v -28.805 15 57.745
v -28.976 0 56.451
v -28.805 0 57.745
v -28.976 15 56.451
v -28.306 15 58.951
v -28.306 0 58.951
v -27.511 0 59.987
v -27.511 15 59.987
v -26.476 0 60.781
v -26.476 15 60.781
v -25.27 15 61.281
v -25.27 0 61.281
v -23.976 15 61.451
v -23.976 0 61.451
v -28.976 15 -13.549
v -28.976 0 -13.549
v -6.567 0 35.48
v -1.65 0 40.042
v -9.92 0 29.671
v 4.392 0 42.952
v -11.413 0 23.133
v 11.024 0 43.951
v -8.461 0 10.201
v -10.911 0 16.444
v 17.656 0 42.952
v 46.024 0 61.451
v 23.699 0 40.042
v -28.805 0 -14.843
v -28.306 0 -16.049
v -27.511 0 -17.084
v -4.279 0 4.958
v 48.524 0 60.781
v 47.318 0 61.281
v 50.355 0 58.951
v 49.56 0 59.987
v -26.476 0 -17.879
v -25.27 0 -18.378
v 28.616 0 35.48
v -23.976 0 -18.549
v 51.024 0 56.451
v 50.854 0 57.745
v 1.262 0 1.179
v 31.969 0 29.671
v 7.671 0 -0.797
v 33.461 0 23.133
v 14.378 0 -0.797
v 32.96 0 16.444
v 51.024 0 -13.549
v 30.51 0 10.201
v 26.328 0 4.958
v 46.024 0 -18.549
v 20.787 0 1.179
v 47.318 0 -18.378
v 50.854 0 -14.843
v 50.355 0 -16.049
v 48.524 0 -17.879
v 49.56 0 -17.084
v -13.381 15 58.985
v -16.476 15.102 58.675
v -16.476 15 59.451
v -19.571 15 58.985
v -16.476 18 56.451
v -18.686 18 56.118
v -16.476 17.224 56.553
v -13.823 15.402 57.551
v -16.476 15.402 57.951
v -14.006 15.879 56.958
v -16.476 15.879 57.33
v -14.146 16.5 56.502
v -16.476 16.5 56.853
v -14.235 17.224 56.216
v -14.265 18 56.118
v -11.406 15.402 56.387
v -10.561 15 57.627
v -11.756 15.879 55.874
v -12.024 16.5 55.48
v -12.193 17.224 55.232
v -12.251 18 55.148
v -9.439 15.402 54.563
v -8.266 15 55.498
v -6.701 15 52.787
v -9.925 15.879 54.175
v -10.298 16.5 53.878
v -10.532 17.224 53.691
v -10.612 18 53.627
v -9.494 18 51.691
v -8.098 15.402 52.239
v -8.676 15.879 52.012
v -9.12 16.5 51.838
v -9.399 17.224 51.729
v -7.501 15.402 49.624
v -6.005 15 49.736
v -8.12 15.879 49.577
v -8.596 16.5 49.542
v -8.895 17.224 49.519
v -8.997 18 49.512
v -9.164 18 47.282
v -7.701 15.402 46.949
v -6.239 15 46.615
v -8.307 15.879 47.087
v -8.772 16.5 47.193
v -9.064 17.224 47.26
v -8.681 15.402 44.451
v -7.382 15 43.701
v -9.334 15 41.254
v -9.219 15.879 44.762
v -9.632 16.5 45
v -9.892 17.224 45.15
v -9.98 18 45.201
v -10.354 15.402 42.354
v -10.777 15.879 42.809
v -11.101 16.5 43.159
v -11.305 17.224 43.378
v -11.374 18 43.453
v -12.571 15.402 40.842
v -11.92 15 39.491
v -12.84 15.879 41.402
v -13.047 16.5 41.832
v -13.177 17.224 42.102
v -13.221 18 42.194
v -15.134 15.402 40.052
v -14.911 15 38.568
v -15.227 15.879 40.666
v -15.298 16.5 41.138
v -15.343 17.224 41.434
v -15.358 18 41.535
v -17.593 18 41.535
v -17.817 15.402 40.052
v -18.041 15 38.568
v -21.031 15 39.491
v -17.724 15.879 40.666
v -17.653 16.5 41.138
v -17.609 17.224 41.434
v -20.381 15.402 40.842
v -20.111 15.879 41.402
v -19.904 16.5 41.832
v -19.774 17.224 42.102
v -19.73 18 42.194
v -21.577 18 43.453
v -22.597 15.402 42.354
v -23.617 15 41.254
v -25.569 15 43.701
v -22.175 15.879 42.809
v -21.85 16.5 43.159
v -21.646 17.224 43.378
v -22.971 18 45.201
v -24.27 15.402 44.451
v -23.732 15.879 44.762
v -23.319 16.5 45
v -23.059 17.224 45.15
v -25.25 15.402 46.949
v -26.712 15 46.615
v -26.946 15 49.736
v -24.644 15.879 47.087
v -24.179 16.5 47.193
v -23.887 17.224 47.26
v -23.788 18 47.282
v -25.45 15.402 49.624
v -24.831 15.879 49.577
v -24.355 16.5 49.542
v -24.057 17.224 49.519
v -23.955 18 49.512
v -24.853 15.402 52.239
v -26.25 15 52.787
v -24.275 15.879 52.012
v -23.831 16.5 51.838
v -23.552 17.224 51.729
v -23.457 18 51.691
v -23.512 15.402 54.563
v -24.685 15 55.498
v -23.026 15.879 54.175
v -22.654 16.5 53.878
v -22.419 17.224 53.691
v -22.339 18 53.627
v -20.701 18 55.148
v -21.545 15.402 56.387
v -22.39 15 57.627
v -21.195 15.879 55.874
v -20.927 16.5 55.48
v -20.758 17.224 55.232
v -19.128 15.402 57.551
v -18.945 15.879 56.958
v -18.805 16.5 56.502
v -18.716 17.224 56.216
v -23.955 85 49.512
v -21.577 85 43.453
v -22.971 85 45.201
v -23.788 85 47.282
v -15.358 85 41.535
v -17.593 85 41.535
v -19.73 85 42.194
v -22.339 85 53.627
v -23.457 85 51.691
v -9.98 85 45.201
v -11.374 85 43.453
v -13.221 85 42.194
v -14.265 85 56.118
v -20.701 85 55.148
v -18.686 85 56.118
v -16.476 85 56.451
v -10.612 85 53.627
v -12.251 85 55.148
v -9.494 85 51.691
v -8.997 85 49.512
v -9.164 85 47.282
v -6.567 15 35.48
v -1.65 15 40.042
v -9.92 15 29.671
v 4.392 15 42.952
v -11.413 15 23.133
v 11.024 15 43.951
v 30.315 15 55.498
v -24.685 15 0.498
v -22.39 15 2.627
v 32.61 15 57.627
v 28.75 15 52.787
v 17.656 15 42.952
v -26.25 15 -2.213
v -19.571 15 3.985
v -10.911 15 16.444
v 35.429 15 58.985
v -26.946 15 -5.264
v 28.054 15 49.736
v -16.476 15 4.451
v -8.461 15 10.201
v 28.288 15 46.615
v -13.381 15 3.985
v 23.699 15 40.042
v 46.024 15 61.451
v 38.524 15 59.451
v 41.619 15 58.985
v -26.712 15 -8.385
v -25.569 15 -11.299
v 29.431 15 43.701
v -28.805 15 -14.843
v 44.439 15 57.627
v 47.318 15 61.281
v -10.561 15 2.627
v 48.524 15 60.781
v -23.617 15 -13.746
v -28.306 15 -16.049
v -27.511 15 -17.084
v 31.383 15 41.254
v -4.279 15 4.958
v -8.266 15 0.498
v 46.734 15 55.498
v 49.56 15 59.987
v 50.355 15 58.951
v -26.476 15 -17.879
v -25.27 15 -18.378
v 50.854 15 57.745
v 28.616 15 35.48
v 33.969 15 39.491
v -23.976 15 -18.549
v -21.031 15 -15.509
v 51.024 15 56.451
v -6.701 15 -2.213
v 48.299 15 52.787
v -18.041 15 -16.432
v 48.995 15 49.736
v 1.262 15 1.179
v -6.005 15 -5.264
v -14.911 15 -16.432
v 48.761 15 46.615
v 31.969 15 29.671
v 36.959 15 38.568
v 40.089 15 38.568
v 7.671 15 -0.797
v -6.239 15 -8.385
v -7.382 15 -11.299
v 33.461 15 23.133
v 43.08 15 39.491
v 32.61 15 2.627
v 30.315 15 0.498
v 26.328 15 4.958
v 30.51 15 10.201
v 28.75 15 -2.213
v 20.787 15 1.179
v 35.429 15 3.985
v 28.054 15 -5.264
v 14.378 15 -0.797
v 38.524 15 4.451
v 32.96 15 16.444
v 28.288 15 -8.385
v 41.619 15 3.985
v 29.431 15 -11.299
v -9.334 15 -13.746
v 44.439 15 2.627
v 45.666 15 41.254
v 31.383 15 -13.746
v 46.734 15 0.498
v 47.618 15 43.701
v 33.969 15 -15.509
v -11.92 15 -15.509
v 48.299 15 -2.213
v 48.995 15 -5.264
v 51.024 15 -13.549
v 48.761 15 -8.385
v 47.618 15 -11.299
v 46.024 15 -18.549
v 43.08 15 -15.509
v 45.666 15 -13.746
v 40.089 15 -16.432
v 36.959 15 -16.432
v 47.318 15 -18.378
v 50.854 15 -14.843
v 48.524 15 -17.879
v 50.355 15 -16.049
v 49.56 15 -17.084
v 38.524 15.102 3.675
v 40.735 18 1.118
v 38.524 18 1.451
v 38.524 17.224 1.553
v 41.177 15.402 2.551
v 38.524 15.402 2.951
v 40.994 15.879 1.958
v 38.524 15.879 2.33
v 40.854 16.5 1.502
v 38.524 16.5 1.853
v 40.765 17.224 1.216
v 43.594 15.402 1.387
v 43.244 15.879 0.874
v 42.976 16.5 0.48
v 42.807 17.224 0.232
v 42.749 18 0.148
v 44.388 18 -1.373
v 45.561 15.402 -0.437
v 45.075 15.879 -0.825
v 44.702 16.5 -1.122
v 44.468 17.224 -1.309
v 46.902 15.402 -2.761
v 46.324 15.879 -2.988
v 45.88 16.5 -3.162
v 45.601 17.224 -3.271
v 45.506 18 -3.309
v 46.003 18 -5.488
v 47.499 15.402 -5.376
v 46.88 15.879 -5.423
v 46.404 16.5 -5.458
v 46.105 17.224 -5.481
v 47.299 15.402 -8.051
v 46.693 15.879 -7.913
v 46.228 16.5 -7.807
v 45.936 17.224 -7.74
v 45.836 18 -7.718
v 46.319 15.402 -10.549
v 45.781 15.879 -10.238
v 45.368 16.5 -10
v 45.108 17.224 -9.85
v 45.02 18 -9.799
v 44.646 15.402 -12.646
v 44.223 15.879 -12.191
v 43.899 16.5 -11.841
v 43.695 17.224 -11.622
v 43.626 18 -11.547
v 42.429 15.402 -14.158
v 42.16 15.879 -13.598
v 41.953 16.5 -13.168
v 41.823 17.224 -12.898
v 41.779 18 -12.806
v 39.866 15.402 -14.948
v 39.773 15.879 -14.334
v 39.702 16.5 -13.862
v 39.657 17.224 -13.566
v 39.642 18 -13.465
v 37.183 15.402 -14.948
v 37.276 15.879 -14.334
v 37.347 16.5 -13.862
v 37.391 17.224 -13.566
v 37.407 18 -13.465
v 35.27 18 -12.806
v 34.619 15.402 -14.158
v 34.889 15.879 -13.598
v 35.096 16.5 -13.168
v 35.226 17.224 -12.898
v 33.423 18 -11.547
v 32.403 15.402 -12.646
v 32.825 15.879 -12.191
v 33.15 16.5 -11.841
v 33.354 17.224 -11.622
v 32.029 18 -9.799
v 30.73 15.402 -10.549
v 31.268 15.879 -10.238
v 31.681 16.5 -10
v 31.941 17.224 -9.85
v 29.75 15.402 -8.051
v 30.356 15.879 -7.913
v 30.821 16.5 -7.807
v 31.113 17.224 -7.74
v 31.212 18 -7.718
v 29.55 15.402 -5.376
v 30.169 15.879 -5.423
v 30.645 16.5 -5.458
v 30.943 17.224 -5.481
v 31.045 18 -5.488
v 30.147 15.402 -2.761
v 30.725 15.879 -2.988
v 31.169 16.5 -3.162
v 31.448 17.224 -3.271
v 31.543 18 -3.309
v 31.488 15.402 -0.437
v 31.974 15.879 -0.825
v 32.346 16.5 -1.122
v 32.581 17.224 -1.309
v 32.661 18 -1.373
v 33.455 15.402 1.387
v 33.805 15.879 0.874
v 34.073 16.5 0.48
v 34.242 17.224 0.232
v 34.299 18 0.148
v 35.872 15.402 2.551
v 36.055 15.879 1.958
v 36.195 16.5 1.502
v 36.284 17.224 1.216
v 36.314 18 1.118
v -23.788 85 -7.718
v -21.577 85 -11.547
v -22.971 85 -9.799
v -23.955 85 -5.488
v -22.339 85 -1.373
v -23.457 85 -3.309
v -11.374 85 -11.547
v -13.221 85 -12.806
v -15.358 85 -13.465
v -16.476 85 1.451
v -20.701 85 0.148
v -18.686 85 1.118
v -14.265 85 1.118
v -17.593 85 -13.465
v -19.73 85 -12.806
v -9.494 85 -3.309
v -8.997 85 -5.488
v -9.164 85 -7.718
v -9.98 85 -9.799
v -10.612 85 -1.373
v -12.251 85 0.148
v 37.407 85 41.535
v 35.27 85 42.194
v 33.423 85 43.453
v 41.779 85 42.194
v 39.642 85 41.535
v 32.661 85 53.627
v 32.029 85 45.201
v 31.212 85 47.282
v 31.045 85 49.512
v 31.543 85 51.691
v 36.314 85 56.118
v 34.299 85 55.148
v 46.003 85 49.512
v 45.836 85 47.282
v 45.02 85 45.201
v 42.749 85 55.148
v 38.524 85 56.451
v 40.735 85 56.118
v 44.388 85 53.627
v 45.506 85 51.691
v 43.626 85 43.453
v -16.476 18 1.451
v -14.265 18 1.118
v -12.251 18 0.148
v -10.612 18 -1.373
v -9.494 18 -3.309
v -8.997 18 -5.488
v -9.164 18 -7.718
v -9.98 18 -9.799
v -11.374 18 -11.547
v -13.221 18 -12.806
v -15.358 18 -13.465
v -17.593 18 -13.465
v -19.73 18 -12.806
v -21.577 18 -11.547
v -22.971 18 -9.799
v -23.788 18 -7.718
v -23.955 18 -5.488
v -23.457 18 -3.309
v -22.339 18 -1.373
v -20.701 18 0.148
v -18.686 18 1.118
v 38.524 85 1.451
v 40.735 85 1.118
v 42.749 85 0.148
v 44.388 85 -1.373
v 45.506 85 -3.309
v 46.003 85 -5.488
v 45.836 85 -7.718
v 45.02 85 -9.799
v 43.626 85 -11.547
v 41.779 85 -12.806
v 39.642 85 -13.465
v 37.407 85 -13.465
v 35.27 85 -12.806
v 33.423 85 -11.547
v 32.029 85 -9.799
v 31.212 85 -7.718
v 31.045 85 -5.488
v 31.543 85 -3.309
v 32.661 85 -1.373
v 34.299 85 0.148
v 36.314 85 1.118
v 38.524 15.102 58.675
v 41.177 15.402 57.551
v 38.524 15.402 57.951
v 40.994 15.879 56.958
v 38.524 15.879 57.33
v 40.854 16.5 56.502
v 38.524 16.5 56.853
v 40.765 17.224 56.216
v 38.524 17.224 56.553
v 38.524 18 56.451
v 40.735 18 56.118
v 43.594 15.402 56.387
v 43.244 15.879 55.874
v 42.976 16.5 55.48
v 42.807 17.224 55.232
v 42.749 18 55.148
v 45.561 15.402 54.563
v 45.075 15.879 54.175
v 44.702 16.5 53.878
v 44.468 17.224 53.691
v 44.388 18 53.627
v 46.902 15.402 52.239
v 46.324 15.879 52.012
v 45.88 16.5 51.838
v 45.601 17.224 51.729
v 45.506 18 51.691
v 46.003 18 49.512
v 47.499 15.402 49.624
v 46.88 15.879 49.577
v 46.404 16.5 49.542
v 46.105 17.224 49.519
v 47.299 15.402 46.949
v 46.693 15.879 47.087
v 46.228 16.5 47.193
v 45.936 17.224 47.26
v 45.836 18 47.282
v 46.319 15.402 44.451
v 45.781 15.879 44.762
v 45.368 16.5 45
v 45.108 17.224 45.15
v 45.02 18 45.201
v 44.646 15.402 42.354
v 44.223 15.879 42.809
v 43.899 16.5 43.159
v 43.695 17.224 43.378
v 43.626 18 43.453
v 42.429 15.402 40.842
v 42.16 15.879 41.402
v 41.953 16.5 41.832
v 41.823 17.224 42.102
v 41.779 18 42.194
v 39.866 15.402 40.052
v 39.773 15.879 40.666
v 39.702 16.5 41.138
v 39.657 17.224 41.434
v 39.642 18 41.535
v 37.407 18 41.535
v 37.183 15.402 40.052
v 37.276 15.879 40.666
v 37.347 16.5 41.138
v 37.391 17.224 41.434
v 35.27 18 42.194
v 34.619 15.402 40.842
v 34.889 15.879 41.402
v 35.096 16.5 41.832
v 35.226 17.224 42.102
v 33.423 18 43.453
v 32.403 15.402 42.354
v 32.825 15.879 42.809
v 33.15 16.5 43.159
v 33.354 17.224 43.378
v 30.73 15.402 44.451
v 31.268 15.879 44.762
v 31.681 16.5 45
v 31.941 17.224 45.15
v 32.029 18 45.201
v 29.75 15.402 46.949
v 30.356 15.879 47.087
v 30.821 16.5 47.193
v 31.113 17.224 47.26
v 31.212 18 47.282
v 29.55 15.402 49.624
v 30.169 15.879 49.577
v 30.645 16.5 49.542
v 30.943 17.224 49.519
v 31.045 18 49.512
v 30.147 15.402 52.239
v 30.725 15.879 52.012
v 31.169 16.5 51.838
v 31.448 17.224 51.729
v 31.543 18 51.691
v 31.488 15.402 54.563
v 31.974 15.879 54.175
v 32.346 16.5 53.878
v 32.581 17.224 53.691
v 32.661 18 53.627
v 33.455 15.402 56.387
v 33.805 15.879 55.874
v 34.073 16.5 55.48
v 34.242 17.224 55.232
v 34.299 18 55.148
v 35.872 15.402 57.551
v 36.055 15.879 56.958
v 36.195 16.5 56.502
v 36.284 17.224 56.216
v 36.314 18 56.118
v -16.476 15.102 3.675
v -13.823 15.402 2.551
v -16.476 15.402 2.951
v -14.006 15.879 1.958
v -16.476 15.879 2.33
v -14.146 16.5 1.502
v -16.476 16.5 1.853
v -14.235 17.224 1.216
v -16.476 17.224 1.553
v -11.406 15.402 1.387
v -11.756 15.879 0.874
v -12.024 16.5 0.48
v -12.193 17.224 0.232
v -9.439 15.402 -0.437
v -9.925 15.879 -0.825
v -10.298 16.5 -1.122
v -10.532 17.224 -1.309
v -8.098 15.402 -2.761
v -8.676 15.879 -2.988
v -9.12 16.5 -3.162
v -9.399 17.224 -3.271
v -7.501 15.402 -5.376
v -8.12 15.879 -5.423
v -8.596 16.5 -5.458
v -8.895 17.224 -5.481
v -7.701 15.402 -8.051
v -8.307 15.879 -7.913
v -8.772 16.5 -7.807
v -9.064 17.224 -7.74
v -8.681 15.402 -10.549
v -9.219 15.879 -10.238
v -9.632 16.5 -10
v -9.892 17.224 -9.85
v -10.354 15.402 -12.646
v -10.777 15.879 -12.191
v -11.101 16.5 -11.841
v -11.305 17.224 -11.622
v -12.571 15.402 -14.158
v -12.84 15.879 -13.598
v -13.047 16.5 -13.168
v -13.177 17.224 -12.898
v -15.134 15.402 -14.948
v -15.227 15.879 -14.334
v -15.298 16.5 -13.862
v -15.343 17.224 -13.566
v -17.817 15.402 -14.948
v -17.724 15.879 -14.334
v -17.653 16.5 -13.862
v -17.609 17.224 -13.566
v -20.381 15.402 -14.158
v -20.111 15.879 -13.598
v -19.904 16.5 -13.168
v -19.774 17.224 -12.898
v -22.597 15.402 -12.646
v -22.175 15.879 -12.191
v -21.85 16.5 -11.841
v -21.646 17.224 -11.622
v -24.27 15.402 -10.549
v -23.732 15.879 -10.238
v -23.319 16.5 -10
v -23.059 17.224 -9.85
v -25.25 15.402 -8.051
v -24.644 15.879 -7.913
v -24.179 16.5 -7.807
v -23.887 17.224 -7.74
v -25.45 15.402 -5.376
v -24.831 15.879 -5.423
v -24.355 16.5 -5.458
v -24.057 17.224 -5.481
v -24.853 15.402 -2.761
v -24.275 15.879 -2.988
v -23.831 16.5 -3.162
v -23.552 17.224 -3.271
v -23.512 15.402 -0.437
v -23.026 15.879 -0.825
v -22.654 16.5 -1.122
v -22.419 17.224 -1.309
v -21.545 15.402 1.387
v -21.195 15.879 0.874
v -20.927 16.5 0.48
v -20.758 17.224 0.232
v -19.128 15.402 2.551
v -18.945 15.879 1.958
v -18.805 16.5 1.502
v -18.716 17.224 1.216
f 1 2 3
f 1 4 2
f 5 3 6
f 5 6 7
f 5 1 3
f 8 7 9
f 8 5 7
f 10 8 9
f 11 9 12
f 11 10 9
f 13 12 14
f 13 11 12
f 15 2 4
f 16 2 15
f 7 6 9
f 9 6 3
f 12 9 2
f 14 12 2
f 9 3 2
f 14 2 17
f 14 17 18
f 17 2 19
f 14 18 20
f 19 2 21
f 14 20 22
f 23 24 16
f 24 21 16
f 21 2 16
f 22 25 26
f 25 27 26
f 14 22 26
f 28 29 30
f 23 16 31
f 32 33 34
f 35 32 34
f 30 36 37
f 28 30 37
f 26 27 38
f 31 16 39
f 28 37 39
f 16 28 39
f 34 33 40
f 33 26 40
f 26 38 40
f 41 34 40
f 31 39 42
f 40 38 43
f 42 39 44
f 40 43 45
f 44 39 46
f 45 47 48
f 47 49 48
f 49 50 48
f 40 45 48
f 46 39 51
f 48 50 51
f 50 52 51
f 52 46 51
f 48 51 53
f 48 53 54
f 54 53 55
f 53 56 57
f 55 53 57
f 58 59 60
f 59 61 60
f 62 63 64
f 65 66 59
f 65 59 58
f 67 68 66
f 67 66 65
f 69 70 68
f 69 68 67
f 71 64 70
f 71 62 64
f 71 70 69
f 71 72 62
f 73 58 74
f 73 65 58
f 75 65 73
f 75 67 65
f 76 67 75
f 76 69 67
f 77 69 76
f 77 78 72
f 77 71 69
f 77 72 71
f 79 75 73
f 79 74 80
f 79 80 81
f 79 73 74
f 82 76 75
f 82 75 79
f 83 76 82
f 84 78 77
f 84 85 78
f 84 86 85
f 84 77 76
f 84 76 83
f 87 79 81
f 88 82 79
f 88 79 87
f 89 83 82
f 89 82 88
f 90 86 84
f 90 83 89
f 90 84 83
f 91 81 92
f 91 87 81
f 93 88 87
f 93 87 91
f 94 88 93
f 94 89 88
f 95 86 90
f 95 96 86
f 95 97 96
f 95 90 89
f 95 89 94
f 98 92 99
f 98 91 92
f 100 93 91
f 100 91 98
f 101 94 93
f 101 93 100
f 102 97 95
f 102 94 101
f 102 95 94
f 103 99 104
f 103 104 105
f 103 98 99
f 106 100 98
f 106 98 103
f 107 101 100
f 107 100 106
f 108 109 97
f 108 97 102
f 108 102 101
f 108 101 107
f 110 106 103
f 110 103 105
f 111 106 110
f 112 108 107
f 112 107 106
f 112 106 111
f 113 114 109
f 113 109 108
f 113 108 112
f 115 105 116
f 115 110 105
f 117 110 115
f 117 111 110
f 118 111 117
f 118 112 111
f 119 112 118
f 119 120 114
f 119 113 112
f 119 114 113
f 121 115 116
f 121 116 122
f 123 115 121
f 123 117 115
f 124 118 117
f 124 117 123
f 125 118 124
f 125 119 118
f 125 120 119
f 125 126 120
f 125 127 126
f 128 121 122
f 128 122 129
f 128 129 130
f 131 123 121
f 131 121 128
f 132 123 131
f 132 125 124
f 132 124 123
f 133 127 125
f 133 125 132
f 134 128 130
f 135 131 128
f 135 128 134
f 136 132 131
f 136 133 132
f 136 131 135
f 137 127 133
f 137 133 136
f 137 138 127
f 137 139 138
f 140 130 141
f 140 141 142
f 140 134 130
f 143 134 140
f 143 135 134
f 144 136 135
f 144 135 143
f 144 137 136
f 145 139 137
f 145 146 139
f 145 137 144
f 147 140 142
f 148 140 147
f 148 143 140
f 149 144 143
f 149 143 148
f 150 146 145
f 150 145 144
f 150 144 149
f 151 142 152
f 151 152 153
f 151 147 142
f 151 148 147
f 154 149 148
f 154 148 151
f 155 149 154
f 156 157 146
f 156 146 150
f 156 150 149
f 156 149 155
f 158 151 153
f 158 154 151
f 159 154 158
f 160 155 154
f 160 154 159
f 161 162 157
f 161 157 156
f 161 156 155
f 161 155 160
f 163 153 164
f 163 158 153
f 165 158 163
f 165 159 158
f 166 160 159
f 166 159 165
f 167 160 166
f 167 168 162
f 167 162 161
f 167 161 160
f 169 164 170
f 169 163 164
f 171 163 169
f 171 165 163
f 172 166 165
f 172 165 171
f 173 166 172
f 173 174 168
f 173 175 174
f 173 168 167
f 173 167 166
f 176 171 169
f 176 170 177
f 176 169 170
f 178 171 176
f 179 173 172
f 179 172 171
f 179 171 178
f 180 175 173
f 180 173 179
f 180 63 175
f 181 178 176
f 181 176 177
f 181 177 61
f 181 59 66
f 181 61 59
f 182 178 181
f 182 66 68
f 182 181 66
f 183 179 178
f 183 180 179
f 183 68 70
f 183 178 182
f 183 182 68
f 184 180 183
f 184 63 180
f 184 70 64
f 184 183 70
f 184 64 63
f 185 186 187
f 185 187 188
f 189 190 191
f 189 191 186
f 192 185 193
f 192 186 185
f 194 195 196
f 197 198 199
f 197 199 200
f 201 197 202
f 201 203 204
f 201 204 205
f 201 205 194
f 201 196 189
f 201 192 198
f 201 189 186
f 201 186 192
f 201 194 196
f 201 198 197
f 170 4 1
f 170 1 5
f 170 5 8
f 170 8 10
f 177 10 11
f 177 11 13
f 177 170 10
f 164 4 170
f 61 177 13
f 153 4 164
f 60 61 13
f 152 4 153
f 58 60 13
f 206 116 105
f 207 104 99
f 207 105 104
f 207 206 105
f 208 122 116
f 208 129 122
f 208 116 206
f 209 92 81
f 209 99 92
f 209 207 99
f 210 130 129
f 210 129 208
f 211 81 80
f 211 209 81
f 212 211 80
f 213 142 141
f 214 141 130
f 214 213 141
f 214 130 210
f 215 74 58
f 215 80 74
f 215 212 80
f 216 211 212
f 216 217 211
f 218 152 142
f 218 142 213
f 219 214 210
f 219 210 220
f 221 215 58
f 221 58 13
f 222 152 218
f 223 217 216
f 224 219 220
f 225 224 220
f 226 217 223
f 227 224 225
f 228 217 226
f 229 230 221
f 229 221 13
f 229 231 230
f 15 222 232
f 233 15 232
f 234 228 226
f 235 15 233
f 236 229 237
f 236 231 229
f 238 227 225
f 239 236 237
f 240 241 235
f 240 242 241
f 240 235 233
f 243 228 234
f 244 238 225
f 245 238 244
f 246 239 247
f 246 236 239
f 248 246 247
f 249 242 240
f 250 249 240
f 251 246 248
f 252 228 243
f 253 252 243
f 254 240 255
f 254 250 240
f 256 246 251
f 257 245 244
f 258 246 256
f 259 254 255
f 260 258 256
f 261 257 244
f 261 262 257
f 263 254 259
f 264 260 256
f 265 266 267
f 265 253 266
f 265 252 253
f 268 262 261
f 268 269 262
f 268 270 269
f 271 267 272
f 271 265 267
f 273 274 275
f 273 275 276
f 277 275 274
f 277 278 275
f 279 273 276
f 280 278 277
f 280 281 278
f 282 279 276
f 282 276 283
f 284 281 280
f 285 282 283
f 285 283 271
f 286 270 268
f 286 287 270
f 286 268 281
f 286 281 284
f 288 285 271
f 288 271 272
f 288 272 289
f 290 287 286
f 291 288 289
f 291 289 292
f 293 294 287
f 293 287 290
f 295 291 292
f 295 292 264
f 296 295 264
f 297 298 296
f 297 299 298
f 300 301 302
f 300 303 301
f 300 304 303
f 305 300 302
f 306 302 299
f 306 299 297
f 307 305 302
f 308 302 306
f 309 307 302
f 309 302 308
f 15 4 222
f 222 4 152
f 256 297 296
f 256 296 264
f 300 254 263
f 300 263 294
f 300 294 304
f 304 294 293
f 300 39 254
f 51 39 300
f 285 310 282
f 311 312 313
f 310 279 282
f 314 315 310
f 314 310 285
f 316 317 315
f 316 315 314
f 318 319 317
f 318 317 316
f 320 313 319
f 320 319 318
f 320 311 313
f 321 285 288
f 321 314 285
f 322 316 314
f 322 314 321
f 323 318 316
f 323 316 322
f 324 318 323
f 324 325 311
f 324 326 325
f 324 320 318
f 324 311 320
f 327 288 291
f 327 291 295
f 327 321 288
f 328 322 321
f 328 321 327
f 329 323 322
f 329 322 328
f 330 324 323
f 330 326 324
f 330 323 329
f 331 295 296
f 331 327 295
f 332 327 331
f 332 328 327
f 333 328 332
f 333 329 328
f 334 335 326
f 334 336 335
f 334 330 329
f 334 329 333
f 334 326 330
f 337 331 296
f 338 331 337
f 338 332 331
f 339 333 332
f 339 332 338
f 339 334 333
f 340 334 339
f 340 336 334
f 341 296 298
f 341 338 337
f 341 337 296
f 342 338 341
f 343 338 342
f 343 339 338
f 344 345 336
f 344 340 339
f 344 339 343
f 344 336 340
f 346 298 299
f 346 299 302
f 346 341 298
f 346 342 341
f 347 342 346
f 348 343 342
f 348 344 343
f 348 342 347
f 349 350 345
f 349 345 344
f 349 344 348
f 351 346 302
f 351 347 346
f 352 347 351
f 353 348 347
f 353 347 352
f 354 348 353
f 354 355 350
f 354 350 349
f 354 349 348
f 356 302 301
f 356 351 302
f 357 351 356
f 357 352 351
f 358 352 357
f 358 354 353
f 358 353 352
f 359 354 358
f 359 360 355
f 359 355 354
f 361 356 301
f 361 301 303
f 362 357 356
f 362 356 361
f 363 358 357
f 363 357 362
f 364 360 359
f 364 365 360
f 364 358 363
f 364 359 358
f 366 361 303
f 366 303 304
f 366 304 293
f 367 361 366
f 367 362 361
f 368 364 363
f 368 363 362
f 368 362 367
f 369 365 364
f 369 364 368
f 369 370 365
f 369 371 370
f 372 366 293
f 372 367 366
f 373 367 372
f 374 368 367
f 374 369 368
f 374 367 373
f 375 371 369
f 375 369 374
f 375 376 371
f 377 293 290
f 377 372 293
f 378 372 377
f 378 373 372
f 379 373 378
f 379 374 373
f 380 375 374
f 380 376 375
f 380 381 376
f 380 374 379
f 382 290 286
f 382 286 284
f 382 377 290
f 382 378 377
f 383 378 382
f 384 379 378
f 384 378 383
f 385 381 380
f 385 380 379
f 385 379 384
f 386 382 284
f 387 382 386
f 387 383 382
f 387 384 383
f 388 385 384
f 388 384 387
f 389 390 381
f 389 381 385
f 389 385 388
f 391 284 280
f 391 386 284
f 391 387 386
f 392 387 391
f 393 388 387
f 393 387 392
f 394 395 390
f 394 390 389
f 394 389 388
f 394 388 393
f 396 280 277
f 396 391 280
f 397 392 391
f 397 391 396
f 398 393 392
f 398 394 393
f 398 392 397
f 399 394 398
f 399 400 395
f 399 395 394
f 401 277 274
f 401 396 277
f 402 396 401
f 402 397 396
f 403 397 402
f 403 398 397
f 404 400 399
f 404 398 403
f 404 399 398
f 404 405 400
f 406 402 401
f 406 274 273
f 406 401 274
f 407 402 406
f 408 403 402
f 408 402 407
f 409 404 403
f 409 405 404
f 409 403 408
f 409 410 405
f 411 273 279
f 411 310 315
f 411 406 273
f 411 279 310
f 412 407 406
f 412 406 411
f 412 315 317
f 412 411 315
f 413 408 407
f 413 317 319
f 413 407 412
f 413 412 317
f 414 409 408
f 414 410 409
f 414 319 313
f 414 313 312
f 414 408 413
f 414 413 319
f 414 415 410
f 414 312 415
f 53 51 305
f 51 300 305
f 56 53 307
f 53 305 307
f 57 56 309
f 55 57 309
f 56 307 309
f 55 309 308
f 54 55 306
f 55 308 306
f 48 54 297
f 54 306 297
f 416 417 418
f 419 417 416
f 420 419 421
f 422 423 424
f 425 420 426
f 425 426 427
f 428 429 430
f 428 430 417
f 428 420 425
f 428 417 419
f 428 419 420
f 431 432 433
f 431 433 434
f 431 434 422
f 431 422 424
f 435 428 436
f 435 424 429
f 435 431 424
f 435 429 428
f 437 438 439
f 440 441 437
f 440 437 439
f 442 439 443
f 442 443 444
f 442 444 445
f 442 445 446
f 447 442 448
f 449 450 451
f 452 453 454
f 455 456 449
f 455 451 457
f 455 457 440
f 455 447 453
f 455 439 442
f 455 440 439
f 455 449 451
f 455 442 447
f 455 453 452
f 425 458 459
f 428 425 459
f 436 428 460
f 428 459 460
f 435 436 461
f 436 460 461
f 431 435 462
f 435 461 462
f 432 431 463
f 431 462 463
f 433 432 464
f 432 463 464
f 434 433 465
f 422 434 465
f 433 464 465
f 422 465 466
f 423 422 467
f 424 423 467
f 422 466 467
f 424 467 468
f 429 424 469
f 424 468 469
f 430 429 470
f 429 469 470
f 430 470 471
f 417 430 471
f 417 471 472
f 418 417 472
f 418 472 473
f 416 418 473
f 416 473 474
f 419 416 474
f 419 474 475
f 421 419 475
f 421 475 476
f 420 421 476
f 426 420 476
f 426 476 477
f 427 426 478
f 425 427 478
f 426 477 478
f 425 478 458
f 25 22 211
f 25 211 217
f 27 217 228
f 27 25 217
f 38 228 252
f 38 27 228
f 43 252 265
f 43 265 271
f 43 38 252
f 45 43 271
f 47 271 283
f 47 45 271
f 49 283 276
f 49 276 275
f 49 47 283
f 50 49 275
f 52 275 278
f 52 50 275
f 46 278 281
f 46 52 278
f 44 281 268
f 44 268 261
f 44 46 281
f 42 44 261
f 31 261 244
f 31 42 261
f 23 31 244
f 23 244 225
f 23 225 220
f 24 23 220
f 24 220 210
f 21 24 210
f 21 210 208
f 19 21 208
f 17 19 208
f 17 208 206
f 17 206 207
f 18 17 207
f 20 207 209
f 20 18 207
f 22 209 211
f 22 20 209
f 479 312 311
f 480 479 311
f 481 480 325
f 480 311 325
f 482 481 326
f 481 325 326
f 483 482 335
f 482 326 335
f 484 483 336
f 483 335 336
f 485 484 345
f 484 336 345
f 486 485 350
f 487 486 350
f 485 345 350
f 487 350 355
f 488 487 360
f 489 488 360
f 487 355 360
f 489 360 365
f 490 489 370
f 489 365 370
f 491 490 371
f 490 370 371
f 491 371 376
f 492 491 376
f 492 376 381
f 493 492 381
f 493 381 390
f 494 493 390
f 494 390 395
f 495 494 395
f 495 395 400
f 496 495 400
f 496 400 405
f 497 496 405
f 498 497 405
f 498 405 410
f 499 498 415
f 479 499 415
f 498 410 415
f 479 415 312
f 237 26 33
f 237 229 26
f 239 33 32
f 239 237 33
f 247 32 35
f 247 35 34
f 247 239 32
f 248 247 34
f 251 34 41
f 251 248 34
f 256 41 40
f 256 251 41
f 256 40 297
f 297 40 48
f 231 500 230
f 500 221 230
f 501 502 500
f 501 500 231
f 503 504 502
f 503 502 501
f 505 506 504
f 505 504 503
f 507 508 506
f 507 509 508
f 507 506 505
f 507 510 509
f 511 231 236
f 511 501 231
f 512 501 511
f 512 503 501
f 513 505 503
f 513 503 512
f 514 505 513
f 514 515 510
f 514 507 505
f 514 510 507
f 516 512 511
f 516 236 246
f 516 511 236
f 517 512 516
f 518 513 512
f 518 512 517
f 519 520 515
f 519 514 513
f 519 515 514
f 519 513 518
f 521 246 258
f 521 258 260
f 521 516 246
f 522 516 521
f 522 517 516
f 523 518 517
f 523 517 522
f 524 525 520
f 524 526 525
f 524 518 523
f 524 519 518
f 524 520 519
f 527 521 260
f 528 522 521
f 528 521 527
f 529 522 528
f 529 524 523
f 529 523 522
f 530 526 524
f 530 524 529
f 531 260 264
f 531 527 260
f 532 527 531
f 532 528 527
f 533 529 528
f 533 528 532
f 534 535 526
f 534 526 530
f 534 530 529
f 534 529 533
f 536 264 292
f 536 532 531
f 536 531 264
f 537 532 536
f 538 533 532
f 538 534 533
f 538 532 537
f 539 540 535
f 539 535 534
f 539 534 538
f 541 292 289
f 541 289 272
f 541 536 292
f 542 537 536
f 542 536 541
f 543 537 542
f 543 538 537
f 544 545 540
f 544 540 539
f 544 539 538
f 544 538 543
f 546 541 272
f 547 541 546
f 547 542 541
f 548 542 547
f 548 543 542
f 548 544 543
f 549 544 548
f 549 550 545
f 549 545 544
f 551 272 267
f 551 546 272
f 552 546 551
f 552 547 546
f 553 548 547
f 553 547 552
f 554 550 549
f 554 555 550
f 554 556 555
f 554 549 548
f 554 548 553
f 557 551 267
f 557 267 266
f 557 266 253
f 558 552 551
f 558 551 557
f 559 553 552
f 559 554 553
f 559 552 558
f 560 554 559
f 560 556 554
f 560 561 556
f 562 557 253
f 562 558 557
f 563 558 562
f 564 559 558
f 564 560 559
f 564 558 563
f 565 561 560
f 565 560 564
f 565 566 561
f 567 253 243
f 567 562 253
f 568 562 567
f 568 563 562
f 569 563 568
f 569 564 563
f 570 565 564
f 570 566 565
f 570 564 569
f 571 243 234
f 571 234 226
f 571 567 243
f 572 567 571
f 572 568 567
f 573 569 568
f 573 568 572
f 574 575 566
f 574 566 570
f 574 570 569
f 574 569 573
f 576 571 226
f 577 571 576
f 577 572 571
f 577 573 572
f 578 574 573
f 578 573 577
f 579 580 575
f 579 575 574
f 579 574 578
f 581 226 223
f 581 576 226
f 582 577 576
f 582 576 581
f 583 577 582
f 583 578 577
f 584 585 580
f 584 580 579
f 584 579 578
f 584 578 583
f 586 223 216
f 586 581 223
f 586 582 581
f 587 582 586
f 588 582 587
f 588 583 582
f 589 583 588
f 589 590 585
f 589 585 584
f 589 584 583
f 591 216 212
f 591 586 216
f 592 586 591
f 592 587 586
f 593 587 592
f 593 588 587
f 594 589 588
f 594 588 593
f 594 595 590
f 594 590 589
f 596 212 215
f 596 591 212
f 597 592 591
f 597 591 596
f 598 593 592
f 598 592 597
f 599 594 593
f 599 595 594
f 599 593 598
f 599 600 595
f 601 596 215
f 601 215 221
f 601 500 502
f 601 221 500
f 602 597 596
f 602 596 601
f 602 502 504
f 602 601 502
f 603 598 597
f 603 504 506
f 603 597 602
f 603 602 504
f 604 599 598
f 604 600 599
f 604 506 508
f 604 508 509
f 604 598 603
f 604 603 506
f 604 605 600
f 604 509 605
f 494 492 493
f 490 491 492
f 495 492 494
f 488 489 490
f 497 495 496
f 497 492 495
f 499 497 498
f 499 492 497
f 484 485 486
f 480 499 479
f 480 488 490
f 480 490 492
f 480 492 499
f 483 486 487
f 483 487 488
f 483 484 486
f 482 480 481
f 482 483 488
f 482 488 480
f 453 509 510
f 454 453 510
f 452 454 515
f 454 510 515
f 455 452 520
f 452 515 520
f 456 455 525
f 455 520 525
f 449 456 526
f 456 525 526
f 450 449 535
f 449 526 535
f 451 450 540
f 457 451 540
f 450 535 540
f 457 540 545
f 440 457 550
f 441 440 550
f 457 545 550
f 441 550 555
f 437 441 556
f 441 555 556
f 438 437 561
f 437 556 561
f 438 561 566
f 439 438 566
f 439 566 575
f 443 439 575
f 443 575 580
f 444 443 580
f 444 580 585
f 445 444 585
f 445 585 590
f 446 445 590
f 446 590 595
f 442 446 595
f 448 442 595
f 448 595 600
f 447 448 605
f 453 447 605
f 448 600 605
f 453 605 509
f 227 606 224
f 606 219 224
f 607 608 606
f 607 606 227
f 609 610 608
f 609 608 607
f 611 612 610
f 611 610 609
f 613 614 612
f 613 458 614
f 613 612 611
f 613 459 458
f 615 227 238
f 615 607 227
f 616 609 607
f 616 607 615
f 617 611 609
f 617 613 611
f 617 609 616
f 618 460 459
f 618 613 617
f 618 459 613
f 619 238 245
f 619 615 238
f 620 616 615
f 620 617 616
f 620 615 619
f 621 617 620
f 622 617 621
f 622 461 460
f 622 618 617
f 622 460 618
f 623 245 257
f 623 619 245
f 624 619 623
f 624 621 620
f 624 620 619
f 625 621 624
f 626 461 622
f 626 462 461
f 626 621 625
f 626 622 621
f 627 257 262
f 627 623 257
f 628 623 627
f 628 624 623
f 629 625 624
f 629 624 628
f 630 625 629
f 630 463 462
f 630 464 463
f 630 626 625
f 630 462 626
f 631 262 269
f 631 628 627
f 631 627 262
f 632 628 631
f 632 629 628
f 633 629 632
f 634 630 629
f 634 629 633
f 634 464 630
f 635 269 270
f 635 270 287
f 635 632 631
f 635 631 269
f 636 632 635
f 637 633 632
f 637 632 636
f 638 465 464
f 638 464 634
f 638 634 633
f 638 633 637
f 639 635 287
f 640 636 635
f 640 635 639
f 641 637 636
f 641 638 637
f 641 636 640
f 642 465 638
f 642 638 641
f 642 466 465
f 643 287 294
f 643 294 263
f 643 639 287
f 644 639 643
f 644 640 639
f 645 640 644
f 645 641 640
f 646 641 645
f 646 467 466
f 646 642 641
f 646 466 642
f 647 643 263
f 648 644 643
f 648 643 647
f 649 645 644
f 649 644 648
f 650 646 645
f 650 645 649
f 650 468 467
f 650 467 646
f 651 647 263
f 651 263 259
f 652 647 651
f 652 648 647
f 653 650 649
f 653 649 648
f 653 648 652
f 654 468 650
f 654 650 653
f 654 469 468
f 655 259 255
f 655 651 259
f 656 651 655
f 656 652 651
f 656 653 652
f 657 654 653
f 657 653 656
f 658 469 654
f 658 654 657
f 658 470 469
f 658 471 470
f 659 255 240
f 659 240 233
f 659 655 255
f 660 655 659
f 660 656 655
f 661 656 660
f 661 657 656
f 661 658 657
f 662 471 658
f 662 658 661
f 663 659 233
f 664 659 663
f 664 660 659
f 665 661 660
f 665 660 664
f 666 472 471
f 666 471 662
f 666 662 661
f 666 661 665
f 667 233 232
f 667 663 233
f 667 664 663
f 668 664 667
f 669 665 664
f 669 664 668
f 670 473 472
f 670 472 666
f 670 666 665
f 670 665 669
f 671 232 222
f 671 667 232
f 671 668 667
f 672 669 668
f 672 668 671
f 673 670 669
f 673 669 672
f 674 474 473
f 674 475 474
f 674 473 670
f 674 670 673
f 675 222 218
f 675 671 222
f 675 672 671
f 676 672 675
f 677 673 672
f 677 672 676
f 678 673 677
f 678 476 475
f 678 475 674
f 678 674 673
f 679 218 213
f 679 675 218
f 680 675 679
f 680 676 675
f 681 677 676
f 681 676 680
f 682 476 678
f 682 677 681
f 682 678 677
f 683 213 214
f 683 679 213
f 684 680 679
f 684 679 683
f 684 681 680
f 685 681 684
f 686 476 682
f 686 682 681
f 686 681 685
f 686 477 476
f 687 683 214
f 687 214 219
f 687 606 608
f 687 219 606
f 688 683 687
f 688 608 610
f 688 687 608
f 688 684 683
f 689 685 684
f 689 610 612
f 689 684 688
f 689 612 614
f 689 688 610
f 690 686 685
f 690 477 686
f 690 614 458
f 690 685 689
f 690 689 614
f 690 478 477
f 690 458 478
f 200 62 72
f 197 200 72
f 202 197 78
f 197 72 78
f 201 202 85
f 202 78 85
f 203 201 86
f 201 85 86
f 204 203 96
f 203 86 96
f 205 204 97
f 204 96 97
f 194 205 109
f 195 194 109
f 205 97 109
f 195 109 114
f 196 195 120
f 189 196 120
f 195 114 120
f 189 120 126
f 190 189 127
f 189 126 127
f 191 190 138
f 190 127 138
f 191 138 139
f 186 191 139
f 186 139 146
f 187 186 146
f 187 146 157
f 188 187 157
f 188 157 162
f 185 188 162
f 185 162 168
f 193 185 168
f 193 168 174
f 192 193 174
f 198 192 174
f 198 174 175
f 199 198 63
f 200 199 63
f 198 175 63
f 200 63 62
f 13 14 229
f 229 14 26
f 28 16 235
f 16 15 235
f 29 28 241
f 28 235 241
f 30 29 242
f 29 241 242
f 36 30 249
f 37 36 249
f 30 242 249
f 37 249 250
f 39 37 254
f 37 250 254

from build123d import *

# Parameters (mm, degrees)
SKETCH_1_W      = 80
SKETCH_1_H      = 80
SKETCH_1_R      = 22.5
EXTRUDE_1_DEPTH = 15
FILLET_1_R      = 5
SKETCH_2_R      = 7.5
EXTRUDE_2_DEPTH = 70
FILLET_2_R      = 3


with BuildPart() as part:
    # 草圖1 → 填料-伸長1 (new body)
    with BuildSketch(Plane(origin=(0, 0, 0), x_dir=(1, 0, 0), z_dir=(0, 1, 0))):
        with Locations((11.024390244, -21.451219512)):
            Rectangle(SKETCH_1_W, SKETCH_1_H)
        with Locations(Location((11.024390244, -21.451219512, 0), (0, 0, 270))):
            Circle(SKETCH_1_R, mode=Mode.SUBTRACT)
    extrude(amount=EXTRUDE_1_DEPTH)

    # 圓角1
    fillet_1_edges = [part.edges().sort_by_distance(p)[0] for p in [
        (-28.975609756, 7.5, -18.548780488),
        (51.024390244, 7.5, -18.548780488),
        (51.024390244, 7.5, 61.451219512),
        (-28.975609756, 7.5, 61.451219512),
    ]]
    fillet(fillet_1_edges, radius=FILLET_1_R)

    # 草圖2 → 填料-伸長2 (add)
    with BuildSketch(Plane(origin=(0, 15, 0), x_dir=(1, 0, 0), z_dir=(0, 1, 0))):
        with Locations(Location((-16.475609756, 6.048780488, 0), (0, 0, 270))):
            Circle(SKETCH_2_R)
        with Locations(Location((38.524390244, 6.048780488, 0), (0, 0, 270))):
            Circle(SKETCH_2_R)
        with Locations(Location((38.524390244, -48.951219512, 0), (0, 0, 270))):
            Circle(SKETCH_2_R)
        with Locations(Location((-16.475609756, -48.951219512, 0), (0, 0, 270))):
            Circle(SKETCH_2_R)
    extrude(amount=EXTRUDE_2_DEPTH)

    # 圓角2
    fillet_2_edges = [part.edges().sort_by_distance(p)[0] for p in [
        (-16.475609756, 15, -13.548780488),
        (38.524390244, 15, -13.548780488),
        (38.524390244, 15, 41.451219512),
        (-16.475609756, 15, 41.451219512),
    ]]
    fillet(fillet_2_edges, radius=FILLET_2_R)


solid = part.part
